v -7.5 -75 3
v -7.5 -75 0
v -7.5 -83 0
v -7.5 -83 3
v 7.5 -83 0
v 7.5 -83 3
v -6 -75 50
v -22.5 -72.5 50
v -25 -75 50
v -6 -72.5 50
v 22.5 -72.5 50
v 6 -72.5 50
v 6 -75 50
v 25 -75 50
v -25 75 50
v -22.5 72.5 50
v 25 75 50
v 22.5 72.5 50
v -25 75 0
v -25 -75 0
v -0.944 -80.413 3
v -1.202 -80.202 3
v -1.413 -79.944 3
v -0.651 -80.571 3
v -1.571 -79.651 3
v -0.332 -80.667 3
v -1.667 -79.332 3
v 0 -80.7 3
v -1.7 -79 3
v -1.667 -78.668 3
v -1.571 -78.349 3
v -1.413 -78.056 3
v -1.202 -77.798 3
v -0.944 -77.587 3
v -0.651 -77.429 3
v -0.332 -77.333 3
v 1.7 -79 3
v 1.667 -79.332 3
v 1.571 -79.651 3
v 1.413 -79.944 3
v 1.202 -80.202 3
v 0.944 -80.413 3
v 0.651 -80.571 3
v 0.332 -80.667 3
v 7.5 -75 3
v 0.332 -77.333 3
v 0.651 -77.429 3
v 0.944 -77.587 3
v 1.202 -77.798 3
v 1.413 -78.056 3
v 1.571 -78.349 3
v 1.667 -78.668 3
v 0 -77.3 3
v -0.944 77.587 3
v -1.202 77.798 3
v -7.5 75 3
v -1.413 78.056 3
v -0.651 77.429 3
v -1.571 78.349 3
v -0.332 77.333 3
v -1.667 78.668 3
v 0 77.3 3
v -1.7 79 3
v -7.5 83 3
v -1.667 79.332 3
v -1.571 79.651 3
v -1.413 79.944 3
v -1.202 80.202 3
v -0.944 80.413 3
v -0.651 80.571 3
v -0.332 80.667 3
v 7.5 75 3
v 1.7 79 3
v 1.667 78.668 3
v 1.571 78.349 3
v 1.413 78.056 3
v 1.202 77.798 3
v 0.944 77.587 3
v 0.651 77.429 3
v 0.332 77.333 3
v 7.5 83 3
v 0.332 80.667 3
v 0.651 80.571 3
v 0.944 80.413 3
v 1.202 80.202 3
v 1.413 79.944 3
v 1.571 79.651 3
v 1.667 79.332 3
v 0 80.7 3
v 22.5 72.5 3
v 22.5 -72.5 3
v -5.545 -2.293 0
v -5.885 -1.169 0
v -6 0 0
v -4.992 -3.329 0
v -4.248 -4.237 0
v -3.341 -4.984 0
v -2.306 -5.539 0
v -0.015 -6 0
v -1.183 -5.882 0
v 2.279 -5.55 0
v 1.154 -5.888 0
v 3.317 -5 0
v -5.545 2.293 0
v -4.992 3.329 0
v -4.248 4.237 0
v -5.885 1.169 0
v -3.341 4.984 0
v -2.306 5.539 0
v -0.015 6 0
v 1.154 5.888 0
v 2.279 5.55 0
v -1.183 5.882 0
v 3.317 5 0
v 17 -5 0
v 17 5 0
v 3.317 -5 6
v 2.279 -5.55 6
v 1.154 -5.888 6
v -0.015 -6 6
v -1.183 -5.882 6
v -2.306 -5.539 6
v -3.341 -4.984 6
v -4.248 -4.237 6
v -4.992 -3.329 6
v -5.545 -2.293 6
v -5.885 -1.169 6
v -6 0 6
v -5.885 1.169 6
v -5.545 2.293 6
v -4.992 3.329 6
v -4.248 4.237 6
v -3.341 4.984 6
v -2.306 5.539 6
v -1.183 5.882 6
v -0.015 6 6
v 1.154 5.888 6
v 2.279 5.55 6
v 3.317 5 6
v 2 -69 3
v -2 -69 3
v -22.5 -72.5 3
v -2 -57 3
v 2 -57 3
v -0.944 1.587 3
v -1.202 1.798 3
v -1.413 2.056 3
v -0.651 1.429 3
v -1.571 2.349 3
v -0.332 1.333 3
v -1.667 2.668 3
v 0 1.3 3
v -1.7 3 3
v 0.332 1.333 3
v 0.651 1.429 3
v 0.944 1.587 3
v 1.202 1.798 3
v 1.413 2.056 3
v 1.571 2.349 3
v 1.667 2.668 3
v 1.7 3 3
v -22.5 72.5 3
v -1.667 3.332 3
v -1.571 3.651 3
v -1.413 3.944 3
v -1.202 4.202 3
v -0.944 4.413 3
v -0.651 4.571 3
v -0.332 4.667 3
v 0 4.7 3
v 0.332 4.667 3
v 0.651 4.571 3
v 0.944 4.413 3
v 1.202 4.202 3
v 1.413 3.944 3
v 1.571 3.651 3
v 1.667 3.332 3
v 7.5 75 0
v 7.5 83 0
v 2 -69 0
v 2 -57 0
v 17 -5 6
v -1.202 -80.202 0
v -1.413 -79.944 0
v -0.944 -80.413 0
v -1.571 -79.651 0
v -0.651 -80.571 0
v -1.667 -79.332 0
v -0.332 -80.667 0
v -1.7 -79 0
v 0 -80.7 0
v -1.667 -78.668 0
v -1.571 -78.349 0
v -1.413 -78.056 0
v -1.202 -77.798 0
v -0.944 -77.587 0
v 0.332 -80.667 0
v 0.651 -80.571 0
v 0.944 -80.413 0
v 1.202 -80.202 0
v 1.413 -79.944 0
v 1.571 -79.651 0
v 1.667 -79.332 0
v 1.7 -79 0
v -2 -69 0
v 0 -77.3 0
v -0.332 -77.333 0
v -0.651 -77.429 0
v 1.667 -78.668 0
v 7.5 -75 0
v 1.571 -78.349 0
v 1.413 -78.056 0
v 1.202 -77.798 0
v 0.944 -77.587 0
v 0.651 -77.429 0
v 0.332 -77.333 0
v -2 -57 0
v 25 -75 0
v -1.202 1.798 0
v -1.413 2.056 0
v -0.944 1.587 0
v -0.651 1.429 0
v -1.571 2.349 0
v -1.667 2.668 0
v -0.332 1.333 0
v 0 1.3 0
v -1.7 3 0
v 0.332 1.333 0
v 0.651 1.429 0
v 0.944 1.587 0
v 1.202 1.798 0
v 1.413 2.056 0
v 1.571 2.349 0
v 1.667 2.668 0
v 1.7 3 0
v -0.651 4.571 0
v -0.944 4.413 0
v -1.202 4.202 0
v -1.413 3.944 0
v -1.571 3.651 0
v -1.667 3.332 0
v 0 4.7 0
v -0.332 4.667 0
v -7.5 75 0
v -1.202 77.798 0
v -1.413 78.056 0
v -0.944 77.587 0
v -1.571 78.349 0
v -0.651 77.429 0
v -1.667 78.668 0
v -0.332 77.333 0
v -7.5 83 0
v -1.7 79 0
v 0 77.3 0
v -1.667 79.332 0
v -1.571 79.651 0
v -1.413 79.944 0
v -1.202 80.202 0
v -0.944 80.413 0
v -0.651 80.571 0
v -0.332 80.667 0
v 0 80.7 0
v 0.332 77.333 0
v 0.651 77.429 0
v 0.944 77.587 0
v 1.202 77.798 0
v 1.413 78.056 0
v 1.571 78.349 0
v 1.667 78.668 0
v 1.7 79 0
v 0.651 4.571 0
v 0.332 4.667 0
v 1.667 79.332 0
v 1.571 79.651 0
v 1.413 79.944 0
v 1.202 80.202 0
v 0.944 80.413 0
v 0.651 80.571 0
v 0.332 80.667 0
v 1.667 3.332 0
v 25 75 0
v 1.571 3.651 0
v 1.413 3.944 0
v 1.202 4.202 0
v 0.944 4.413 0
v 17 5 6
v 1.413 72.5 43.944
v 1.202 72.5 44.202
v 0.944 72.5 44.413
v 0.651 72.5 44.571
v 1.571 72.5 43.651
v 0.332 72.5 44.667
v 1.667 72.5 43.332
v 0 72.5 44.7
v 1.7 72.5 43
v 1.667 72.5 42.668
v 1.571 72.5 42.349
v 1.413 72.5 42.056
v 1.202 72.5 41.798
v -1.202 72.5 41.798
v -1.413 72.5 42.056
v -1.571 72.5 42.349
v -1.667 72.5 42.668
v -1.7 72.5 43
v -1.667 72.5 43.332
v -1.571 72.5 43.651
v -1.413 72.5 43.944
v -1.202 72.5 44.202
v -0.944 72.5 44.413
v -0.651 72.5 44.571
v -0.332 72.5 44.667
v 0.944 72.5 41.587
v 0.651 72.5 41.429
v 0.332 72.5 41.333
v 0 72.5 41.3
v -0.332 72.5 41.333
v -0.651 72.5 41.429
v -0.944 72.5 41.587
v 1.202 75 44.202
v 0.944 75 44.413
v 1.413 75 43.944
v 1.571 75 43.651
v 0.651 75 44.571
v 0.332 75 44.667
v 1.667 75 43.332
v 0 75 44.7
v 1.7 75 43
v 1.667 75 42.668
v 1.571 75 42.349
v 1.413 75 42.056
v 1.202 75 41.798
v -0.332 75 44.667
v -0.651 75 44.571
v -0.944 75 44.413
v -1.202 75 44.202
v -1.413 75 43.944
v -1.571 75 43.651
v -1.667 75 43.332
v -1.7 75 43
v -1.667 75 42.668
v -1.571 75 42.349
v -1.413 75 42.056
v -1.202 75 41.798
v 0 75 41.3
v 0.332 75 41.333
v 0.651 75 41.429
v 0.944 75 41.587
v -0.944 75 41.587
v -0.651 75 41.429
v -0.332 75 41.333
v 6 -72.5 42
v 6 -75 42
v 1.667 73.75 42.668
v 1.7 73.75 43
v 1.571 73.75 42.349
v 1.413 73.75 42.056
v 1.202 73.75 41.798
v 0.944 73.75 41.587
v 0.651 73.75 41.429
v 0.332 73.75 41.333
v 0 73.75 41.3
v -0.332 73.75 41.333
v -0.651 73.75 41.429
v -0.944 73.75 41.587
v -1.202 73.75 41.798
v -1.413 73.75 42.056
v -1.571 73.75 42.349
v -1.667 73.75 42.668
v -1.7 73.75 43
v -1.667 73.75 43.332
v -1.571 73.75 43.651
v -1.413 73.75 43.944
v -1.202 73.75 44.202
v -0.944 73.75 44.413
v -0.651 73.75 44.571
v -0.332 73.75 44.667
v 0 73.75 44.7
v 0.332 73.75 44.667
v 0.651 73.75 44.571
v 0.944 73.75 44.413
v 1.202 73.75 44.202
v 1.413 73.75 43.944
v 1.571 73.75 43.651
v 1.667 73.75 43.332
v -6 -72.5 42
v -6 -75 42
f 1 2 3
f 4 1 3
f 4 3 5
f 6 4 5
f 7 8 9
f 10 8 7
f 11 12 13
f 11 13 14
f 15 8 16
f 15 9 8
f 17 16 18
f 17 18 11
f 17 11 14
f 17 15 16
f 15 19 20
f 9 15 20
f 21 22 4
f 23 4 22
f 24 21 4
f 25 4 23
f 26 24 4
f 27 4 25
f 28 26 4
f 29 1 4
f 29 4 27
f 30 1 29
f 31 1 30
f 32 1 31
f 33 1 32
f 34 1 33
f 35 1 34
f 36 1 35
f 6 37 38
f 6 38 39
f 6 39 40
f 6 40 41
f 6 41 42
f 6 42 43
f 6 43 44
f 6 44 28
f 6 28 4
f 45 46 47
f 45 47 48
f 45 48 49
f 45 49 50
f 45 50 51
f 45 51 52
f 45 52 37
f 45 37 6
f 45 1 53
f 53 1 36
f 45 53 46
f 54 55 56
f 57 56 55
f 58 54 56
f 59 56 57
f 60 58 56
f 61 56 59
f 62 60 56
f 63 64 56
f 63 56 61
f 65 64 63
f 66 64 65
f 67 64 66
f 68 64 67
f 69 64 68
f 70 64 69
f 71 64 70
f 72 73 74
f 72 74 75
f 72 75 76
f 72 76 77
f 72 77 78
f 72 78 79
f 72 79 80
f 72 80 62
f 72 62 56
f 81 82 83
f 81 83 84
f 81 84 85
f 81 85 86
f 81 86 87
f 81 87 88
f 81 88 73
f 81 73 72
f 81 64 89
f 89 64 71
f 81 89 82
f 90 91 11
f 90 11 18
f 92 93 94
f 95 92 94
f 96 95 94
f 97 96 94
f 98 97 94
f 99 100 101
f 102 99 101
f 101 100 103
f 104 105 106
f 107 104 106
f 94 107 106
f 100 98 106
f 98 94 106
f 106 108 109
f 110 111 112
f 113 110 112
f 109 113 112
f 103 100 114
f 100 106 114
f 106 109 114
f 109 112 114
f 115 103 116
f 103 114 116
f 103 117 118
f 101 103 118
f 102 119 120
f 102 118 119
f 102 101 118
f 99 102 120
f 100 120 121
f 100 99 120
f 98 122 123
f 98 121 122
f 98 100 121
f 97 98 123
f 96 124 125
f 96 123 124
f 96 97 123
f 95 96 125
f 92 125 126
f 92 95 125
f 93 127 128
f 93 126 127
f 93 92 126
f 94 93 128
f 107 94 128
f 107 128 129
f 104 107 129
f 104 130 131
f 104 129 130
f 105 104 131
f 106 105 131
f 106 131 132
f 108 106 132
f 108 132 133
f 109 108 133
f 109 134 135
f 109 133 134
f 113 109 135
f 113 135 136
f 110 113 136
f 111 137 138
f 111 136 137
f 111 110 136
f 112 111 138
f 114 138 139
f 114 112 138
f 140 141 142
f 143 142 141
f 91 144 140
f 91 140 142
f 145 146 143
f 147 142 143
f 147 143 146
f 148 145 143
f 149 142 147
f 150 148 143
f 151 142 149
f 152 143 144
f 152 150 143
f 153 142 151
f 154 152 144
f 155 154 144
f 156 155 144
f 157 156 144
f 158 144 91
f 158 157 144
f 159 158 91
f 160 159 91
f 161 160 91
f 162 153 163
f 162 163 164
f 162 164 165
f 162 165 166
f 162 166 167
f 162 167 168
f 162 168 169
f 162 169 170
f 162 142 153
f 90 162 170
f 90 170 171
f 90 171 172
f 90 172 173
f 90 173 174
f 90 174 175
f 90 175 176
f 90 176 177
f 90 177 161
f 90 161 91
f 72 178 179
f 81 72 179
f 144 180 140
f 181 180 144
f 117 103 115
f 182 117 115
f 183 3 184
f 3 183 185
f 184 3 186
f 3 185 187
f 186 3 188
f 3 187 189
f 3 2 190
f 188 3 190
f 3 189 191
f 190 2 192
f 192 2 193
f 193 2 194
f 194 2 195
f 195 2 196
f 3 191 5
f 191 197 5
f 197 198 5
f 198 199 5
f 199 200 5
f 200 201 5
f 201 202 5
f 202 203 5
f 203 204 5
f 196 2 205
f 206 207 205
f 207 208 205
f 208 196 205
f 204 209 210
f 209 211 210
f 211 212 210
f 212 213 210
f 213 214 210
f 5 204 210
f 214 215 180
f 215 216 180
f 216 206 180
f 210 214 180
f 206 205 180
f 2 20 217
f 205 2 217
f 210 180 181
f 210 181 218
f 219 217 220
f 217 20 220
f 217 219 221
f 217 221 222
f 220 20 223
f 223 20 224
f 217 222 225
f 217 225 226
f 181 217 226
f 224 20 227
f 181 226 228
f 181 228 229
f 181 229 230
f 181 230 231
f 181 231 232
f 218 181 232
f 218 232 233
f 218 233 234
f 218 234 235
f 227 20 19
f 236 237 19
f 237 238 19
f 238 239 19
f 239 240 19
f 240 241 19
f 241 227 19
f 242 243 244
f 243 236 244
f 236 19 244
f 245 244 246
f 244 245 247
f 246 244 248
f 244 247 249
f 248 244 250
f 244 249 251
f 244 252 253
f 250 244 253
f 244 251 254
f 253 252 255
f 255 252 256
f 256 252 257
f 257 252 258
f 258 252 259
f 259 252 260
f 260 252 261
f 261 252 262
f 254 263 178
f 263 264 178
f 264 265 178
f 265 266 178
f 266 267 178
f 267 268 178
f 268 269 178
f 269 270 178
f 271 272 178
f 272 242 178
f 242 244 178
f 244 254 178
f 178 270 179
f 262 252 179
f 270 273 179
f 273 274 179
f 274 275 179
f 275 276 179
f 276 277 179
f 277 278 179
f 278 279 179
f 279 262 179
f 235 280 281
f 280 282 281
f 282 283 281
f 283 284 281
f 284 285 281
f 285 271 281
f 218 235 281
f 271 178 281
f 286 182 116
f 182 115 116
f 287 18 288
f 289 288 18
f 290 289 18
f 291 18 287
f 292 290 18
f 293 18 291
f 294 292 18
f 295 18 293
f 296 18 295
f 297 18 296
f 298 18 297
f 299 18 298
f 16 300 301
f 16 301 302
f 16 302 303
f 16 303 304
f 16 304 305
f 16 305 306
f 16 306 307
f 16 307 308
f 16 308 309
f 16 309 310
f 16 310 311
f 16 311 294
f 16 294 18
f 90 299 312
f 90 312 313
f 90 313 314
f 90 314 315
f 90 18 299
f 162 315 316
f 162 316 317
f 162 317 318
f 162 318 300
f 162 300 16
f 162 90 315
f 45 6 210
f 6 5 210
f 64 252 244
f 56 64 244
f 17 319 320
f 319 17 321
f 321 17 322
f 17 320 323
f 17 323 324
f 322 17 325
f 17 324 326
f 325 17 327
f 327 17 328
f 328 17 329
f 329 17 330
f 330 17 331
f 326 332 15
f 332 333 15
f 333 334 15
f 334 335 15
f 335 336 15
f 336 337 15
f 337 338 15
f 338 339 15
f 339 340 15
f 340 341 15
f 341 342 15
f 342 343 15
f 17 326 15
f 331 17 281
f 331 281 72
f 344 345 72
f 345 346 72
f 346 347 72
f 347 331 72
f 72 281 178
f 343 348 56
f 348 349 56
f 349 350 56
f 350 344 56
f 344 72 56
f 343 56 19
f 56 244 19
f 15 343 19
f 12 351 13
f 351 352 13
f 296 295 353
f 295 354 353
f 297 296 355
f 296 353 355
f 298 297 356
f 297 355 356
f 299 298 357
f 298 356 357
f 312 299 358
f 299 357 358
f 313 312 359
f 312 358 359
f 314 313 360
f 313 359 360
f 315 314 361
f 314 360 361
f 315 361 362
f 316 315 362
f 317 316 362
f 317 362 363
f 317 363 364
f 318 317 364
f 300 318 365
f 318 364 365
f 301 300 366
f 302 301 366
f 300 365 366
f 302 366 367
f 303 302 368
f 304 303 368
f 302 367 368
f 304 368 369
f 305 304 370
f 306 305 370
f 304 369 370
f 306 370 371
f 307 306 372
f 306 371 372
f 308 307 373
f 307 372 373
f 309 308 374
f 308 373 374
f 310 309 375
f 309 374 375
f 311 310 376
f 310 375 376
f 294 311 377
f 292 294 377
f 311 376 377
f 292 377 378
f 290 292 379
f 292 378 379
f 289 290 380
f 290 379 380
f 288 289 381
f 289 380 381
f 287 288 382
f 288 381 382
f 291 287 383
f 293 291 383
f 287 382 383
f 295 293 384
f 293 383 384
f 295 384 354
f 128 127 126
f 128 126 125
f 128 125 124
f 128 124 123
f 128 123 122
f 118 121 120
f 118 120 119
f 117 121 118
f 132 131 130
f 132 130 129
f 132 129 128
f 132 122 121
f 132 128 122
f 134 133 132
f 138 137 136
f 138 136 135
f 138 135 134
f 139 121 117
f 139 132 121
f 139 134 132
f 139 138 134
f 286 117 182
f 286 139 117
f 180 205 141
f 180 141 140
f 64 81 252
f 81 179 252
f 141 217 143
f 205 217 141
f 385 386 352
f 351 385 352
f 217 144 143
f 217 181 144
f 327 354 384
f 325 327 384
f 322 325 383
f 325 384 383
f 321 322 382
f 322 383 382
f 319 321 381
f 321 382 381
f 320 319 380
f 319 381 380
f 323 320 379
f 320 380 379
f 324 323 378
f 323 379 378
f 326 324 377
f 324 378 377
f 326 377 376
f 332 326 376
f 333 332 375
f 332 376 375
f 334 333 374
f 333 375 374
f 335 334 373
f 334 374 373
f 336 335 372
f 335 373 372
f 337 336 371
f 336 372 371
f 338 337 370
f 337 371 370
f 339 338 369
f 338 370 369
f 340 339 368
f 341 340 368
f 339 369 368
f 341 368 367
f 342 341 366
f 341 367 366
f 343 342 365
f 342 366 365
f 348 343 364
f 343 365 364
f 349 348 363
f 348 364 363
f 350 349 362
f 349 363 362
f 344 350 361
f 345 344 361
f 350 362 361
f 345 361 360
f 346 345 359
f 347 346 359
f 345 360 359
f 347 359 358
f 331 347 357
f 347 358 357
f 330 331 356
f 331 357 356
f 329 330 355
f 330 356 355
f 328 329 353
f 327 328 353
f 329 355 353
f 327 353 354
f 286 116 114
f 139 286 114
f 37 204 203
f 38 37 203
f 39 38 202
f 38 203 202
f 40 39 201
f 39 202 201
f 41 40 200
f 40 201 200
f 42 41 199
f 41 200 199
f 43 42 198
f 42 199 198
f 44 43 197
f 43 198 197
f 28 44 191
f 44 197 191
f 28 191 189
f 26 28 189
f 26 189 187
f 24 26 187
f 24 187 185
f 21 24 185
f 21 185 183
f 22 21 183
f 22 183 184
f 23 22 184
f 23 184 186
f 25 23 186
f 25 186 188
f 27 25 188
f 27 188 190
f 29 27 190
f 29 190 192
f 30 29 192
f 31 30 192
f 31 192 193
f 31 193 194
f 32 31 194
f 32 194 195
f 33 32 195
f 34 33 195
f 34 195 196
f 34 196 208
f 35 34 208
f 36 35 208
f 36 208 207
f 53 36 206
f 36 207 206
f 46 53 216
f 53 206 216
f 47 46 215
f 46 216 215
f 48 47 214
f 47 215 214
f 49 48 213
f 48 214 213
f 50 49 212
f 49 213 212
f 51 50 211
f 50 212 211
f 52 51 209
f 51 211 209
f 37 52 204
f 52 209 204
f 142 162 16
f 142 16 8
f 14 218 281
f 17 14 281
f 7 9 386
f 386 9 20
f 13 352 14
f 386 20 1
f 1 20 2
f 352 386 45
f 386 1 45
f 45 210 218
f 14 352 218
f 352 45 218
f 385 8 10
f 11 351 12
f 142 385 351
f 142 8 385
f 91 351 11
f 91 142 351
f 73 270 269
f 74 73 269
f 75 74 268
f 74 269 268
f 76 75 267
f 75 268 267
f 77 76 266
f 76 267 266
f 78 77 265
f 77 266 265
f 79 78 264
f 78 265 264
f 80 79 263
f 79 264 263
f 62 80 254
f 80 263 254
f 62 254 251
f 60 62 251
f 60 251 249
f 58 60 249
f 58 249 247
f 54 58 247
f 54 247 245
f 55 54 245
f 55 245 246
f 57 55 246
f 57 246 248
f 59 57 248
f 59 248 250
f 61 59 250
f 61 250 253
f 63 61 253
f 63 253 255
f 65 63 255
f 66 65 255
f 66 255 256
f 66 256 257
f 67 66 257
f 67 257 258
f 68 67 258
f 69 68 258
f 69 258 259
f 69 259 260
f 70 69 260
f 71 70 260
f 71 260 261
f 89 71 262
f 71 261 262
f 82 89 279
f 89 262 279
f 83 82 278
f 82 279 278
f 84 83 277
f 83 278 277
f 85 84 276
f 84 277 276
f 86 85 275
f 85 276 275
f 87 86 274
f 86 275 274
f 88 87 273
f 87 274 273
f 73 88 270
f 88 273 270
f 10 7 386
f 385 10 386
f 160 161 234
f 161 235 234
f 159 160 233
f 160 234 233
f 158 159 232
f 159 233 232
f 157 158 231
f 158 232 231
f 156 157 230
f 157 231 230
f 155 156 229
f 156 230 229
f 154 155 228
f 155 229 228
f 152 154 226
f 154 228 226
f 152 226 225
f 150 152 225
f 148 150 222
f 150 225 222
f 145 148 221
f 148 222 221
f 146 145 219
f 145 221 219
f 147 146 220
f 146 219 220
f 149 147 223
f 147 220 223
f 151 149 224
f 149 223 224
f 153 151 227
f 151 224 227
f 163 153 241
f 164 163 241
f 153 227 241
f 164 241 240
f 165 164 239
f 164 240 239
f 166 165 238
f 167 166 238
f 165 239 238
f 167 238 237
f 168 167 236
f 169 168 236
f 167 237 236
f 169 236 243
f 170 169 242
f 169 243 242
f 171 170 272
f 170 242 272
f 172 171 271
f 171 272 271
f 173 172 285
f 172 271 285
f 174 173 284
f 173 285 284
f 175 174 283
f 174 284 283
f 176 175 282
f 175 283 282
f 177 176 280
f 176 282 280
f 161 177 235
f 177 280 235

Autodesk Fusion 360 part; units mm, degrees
sketch "Sketch1" plane through (0, 0, 0) normal (0, 0, 1) x (1, 0, 0) in component "BATT_LOCK_TRAY_V1"
  line L0 (-25, -75) -> (25, -75)
  line L1 (25, -75) -> (25, 75)
  line L2 (25, 75) -> (-25, 75)
  line L3 (-25, 75) -> (-25, -75)
  line L4 (-22.5, -72.5) -> (22.5, -72.5)
  line L5 (22.5, -72.5) -> (22.5, 72.5)
  line L6 (22.5, 72.5) -> (-22.5, 72.5)
  line L7 (-22.5, 72.5) -> (-22.5, -72.5)
extrude "Extrude1" add sketch "Sketch1" along normal blind 3 contours L0 L1 L2 L3 | L4 L5 L6 L7 makes body 1 in component "BATT_LOCK_TRAY_V1"
extrude "Extrude2" add sketch "Sketch1" along normal blind 50 bodies 1 in component "BATT_LOCK_TRAY_V1"
sketch "Sketch2" plane through (0, 0, 0) normal (0, 0, 1) x (1, 0, 0) in component "BATT_LOCK_TRAY_V1"
  line L0 (-7.5, 75) -> (7.5, 75)
  line L1 (7.5, 75) -> (7.5, 83)
  line L2 (7.5, 83) -> (-7.5, 83)
  line L3 (-7.5, 83) -> (-7.5, 75)
  line L4 (-7.5, -83) -> (7.5, -83)
  line L5 (7.5, -83) -> (7.5, -75)
  line L6 (7.5, -75) -> (-7.5, -75)
  line L7 (-7.5, -75) -> (-7.5, -83)
extrude "Extrude3" add sketch "Sketch2" along normal blind 3 bodies 1 in component "BATT_LOCK_TRAY_V1"
sketch "Sketch3" plane through (0, 0, 0) normal (0, 0, 1) x (1, 0, 0) in component "BATT_LOCK_TRAY_V1"
  circle A0 centre (0, 79) radius 1.7
  circle A1 centre (0, -79) radius 1.7
extrude "Extrude4" cut sketch "Sketch3" along normal blind 5 bodies 1 in component "BATT_LOCK_TRAY_V1"
ref_plane "WorkPlane1" through (0, 73.75, 0) normal (0, 1, 0) x (0, 0, 1) in component "BATT_LOCK_TRAY_V1"
sketch "Sketch4" plane through (0, 73.75, 0) normal (0, 1, 0) x (1, 0, 0) in component "BATT_LOCK_TRAY_V1"
  circle A0 centre (0, -43) radius 1.7
extrude "Extrude5" cut sketch "Sketch4" along normal mid plane 12 bodies 1 in component "BATT_LOCK_TRAY_V1"
ref_plane "WorkPlane2" through (0, -73.75, 0) normal (0, 1, 0) x (0, 0, 1) in component "BATT_LOCK_TRAY_V1"
sketch "Sketch5" plane through (0, -73.75, 0) normal (0, 1, 0) x (1, 0, 0) in component "BATT_LOCK_TRAY_V1"
  line L0 (-6, -42) -> (6, -42)
  line L1 (6, -42) -> (6, -50)
  line L2 (6, -50) -> (-6, -50)
  line L3 (-6, -50) -> (-6, -42)
extrude "Extrude6" cut sketch "Sketch5" along normal mid plane 12 bodies 1 in component "BATT_LOCK_TRAY_V1"
sketch "Sketch6" plane through (0, 0, 0) normal (0, 0, 1) x (1, 0, 0) in component "BATT_LOCK_TRAY_V1"
  line L0 (-2, -69) -> (2, -69)
  line L1 (2, -69) -> (2, -57)
  line L2 (2, -57) -> (-2, -57)
  line L3 (-2, -57) -> (-2, -69)
extrude "Extrude7" cut sketch "Sketch6" along normal blind 4 bodies 1 in component "BATT_LOCK_TRAY_V1"
sketch "Sketch1 (2)" plane through (0, 0, 0) normal (0, 0, 1) x (1, 0, 0) in component "BATT_LOCK_CAM_V2"
  line L0 (0, -5) -> (17, -5)
  line L1 (17, -5) -> (17, 5)
  line L2 (17, 5) -> (0, 5)
  line L3 (0, 5) -> (0, -5)
  circle A0 centre (0, 0) radius 6
extrude "Extrude1'" add sketch "Sketch1 (2)" along normal blind 6 separate body makes body 2 in component "BATT_LOCK_CAM_V2"
sketch "Sketch2 (2)" plane through (0, 0, 0) normal (0, 0, 1) x (1, 0, 0) in component "BATT_LOCK_CAM_V2"
  circle A0 centre (0, 3) radius 1.7
extrude "Extrude8" cut sketch "Sketch2 (2)" along normal blind 8 bodies 1 in component "BATT_LOCK_TRAY_V1"
component "BATT_LOCK_TRAY_V1" placed x (1, 0, 0) y (0, 1, 0) z (0, 0, 1) at (0, 0, 0)
component "BATT_LOCK_CAM_V2" placed x (1, 0, 0) y (0, 1, 0) z (0, 0, 1) at (0, 0, 0)
